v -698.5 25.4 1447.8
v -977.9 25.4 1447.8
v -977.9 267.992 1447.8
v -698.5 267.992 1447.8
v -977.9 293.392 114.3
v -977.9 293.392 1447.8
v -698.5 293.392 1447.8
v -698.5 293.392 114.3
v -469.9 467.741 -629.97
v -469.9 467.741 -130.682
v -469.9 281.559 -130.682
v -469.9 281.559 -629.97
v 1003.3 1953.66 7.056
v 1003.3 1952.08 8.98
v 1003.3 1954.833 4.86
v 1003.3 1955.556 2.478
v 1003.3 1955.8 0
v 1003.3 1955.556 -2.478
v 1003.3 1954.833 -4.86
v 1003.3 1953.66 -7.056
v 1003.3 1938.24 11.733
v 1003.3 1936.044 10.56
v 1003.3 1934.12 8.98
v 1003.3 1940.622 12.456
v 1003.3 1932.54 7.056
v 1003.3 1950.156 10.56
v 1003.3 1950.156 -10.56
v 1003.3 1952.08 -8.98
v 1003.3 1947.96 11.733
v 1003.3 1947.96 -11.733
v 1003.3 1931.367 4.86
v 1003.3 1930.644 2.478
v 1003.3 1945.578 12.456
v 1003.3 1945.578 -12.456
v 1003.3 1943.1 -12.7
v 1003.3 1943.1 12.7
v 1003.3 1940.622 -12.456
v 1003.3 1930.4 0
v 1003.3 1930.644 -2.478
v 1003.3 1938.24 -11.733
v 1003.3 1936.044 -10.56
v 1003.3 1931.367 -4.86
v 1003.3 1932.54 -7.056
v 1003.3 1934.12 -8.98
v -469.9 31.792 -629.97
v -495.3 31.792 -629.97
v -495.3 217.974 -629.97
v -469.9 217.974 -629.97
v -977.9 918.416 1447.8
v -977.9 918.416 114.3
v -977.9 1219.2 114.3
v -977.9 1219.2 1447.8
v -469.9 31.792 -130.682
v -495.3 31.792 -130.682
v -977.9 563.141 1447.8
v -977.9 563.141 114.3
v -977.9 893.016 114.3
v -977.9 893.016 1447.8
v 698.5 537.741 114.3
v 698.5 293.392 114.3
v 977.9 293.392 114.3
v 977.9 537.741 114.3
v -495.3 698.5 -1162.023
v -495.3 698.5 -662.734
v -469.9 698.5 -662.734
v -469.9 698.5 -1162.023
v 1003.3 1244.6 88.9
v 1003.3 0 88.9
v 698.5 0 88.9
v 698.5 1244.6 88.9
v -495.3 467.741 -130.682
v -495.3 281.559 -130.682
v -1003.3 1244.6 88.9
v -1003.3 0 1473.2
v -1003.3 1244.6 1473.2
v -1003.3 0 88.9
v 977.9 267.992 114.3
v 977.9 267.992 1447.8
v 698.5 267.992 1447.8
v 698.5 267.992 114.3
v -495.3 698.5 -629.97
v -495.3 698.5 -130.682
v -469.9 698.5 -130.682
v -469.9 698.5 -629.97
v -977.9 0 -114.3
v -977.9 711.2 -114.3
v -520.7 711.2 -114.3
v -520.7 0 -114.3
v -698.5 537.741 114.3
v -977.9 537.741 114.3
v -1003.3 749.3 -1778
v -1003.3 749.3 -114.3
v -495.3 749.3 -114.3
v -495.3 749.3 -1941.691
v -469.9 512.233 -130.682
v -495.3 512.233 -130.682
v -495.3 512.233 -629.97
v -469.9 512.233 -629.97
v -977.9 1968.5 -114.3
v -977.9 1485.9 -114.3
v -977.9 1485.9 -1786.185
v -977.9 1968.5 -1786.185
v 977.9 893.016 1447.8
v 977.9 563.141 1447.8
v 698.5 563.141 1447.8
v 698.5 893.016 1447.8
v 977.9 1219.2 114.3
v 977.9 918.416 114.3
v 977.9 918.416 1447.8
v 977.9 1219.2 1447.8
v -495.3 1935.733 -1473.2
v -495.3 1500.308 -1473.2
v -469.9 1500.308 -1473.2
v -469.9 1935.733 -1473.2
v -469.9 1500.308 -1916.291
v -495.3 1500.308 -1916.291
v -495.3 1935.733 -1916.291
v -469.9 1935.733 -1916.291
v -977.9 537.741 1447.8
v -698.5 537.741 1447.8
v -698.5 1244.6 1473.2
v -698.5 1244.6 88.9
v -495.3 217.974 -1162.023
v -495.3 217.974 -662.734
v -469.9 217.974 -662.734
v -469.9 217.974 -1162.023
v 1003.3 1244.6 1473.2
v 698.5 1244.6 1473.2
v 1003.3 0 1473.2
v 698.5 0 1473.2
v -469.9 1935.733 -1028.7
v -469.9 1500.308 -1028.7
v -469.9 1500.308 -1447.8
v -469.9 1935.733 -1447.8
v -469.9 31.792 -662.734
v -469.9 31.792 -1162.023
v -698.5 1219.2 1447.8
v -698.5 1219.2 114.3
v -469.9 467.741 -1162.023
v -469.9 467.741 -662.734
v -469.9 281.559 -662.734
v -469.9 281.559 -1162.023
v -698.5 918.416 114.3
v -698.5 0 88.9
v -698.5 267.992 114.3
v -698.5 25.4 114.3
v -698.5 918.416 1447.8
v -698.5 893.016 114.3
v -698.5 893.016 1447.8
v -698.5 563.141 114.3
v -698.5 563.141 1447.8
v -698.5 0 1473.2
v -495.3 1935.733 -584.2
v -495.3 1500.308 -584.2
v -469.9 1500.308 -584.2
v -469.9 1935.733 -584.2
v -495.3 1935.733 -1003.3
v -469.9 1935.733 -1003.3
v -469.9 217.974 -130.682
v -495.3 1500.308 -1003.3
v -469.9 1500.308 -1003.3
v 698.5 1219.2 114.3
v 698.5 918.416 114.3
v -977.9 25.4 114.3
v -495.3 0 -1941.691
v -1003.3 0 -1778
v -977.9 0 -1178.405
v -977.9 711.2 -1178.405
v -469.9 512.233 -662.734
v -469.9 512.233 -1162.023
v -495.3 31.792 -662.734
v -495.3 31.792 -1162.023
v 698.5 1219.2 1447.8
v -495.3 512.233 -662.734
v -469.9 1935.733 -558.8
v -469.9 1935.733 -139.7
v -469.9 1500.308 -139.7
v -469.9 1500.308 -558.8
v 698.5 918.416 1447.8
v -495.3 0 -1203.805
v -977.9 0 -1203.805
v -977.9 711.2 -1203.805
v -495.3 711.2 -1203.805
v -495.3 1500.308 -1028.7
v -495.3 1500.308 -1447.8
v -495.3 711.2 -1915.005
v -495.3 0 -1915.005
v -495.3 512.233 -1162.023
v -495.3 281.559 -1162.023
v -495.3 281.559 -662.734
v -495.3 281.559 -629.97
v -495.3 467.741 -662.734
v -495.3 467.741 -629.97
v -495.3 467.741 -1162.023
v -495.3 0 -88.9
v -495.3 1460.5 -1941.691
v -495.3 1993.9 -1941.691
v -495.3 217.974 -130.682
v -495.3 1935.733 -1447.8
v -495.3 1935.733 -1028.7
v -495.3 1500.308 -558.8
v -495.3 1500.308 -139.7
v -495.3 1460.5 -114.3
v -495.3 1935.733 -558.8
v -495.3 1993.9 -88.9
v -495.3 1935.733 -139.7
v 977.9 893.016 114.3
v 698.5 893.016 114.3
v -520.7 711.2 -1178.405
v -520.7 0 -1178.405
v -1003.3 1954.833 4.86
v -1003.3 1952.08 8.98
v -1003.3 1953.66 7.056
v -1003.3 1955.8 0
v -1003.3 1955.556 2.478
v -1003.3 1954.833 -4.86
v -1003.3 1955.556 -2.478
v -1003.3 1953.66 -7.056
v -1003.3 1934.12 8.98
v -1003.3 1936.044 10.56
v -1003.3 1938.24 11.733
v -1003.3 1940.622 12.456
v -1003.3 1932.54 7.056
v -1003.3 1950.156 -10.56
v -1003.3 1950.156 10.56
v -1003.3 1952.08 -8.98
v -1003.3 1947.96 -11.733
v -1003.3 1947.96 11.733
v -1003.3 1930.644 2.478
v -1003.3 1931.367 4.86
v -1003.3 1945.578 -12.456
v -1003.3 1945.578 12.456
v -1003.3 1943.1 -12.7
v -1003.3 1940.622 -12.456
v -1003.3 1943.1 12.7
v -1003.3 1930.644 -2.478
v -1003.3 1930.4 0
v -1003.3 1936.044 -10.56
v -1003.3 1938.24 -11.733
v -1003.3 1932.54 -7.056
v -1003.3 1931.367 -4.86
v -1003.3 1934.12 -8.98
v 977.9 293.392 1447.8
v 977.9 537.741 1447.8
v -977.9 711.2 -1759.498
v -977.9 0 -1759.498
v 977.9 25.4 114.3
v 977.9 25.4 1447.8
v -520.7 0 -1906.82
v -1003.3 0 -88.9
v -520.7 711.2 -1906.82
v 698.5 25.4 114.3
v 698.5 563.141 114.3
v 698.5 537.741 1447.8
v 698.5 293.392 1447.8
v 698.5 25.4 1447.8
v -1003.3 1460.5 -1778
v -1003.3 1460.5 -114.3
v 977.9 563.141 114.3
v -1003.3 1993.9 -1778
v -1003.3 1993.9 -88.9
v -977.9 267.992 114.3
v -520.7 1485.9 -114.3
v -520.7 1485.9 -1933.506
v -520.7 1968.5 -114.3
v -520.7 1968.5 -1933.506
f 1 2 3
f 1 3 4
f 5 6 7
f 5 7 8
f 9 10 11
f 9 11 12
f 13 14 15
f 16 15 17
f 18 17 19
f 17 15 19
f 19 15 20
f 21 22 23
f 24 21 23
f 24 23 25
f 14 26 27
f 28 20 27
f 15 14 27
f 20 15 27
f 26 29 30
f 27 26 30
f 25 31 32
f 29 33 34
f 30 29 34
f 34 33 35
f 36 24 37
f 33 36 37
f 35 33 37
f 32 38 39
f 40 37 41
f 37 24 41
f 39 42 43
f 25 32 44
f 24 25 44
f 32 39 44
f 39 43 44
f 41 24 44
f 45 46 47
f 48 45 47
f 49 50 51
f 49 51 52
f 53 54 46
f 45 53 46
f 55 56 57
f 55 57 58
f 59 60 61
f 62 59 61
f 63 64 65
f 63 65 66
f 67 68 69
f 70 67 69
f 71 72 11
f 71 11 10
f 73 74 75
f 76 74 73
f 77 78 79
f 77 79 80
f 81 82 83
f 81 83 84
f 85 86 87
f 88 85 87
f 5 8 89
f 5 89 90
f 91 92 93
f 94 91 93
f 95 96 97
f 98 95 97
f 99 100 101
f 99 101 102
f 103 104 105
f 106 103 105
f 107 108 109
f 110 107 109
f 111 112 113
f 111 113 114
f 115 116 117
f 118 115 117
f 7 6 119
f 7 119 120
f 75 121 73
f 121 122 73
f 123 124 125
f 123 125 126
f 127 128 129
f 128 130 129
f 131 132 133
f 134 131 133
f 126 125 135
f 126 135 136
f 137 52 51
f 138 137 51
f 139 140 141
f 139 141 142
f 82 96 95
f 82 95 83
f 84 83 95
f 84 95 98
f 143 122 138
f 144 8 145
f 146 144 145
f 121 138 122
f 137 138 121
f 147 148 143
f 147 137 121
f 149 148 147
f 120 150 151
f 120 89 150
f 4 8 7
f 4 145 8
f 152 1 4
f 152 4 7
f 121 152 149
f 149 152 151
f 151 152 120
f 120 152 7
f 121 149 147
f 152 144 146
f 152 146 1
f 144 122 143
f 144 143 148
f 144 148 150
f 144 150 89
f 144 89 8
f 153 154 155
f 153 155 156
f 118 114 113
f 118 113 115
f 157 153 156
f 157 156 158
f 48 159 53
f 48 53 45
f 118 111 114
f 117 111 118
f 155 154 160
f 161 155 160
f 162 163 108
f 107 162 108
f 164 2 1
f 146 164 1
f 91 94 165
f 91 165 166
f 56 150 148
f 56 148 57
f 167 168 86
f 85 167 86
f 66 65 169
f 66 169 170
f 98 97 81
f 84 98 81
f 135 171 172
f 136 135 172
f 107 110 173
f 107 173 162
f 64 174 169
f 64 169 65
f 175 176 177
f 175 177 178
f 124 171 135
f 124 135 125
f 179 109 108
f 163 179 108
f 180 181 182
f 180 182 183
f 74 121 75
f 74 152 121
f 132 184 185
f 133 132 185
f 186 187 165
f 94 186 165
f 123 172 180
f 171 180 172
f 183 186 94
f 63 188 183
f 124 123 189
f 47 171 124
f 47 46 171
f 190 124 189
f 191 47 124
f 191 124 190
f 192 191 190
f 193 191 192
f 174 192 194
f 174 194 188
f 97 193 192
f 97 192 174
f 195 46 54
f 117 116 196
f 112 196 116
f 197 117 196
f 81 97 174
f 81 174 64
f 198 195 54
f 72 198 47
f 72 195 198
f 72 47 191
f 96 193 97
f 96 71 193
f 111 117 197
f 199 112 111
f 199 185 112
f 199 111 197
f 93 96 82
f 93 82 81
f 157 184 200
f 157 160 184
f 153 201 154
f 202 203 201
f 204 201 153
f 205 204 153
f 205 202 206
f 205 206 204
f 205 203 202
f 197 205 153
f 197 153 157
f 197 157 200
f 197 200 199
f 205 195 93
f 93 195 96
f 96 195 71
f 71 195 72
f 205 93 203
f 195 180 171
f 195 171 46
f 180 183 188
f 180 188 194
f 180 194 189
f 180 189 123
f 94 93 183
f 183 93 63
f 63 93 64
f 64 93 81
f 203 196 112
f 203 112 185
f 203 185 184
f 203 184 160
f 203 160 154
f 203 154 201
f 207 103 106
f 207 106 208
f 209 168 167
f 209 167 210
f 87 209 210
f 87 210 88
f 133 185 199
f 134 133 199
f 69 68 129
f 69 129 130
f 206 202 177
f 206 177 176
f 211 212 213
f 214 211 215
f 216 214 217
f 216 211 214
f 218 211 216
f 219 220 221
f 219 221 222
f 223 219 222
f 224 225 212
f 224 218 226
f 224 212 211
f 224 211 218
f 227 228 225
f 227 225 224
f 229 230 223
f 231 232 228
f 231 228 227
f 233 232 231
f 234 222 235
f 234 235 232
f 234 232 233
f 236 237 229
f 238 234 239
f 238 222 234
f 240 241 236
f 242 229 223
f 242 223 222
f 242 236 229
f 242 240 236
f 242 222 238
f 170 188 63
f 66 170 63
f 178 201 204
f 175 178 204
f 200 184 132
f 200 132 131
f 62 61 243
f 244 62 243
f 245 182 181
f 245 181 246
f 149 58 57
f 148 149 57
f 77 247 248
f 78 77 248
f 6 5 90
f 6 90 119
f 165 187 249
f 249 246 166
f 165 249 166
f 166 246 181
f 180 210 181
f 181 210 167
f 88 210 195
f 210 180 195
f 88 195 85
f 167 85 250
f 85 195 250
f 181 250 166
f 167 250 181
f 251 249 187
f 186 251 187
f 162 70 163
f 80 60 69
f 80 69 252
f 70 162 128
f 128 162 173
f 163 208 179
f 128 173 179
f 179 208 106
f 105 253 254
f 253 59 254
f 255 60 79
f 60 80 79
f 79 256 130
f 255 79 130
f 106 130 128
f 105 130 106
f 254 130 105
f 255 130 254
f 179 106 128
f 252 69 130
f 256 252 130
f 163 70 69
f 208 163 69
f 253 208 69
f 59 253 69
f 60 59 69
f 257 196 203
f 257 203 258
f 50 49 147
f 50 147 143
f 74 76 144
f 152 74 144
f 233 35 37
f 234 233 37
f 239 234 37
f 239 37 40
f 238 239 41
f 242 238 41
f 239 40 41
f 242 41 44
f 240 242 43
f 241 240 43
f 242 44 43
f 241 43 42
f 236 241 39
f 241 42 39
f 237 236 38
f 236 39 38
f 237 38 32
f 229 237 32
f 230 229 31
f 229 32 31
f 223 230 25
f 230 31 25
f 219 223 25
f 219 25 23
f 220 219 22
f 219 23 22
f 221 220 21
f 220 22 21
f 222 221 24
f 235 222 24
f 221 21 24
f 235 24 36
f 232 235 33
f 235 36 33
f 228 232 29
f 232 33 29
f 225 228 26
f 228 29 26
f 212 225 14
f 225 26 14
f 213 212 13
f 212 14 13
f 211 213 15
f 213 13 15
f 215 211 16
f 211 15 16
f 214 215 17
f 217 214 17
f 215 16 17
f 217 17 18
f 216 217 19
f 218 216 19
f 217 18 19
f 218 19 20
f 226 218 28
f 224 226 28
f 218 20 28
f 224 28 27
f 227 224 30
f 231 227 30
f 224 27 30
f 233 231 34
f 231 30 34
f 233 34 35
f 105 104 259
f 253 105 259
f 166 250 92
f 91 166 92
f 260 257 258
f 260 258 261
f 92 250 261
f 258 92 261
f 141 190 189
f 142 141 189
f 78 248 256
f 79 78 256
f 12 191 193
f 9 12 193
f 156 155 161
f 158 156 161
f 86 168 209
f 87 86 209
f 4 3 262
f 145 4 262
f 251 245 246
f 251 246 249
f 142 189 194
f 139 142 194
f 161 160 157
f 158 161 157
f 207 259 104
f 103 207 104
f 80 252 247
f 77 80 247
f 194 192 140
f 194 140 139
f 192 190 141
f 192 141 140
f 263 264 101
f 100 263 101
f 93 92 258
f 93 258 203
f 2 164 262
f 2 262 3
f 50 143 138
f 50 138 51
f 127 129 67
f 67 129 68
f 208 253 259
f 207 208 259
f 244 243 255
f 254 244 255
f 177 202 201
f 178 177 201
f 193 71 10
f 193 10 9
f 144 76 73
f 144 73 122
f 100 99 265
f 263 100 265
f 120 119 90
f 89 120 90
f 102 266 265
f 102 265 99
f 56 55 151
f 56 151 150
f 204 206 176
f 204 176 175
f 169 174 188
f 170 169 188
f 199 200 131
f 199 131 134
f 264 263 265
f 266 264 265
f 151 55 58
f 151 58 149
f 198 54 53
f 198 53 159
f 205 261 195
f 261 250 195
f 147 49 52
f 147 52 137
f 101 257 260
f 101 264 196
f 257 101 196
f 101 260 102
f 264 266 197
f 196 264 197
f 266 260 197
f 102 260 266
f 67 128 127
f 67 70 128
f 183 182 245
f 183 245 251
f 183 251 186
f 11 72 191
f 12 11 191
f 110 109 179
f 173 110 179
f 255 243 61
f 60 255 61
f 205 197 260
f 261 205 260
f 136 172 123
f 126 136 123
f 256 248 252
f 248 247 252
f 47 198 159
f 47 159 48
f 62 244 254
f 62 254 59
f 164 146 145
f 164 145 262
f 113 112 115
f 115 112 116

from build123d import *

# Parameters (mm, degrees)
SKETCH1_R            = 12.7
BOSS_EXTRUDE1_DEPTH  = 2006.6
BOSS_EXTRUDE2_DEPTH  = 38.1
SKETCH4_W            = 457.2
SKETCH4_H            = 1064.104668536
BOSS_EXTRUDE3_DEPTH  = 711.2
SKETCH5_W            = 499.288531824
SKETCH5_H            = 186.266666667
SKETCH5_H_2          = 186.182
BOSS_EXTRUDE4_DEPTH  = 25.4
SKETCH6_W            = 508
SKETCH6_H            = 25.4
BOSS_EXTRUDE5_DEPTH  = 1244.6
BOSS_EXTRUDE6_REACH  = 2886.719
SKETCH7_W            = 508
SKETCH7_H            = 533.4
SKETCH7_W_2          = 457.2
SKETCH7_H_2          = 482.6
SKETCH8_W            = 419.1
SKETCH8_H            = 435.424853887
SKETCH8_W_2          = 443.090744485
BOSS_EXTRUDE7_DEPTH  = 25.4
SKETCH9_W            = 304.8
SKETCH9_H            = 1384.3
BOSS_EXTRUDE8_DEPTH  = 25.4
BOSS_EXTRUDE9_DEPTH  = 1219.2
SKETCH11_W           = 1384.3
SKETCH11_H           = 25.4
BOSS_EXTRUDE10_DEPTH = 279.4


with BuildPart() as part:
    # Sketch1 → Boss-Extrude1 (new body)
    with BuildSketch(Plane.ZY.offset(-1003.3)):
        with Locations(Location((0, 1943.1, 0), (0, 0, 180))):
            Circle(SKETCH1_R)
    extrude(amount=BOSS_EXTRUDE1_DEPTH)


with BuildPart() as body_2:
    # Sketch3 → Boss-Extrude2 (new body)
    with BuildSketch(Plane(origin=(0, 711.2, 0), x_dir=(1, 0, 0), z_dir=(0, 1, 0))):
        Polygon((-495.3, 1941.690744485), (-1003.3, 1778), (-1003.3, 88.9), (-495.3, 88.9), align=None)
    extrude(amount=BOSS_EXTRUDE2_DEPTH)

    # Sketch4 → Boss-Extrude3 (add)
    with BuildSketch(Plane.XZ.offset(-711.2)):
        Polygon((-977.9, -1759.498461275), (-520.7, -1906.820131312), (-495.3, -1915.004668536), (-495.3, -1941.690744485), (-1003.3, -1778), (-1003.3, -88.9), (-495.3, -88.9), (-495.3, -1203.804668536), (-520.7, -1203.804668536), (-977.9, -1203.804668536), align=None)
        with Locations((-749.3, -646.352334268)):
            Rectangle(SKETCH4_W, SKETCH4_H, mode=Mode.SUBTRACT)
    extrude(amount=BOSS_EXTRUDE3_DEPTH)

    # Sketch5 → Boss-Extrude4 (add)
    with BuildSketch(Plane(origin=(-495.3, 0, 0), x_dir=(0, 0, -1), z_dir=(1, 0, 0))):
        with Locations((912.378501402, 605.366666667)):
            Rectangle(SKETCH5_W, SKETCH5_H)
        with Locations((380.326167134, 605.366666667)):
            Rectangle(SKETCH5_W, SKETCH5_H)
        with Locations((912.378501402, 124.883333333)):
            Rectangle(SKETCH5_W, SKETCH5_H_2)
        with Locations((380.326167134, 374.65)):
            Rectangle(SKETCH5_W, SKETCH5_H_2)
        with Locations((380.326167134, 124.883333333)):
            Rectangle(SKETCH5_W, SKETCH5_H_2)
        with Locations((912.378501402, 374.65)):
            Rectangle(SKETCH5_W, SKETCH5_H_2)
    extrude(amount=BOSS_EXTRUDE4_DEPTH)

    # Sketch6 → Boss-Extrude5 (add)
    with BuildSketch(Plane(origin=(0, 749.3, 0), x_dir=(1, 0, 0), z_dir=(0, 1, 0))):
        with Locations((-749.3, 101.6)):
            Rectangle(SKETCH6_W, SKETCH6_H)
    extrude(amount=BOSS_EXTRUDE5_DEPTH)

    # Boss-Extrude6: up to this plane
    boss_extrude6_end = Plane(origin=(-1003.3, 2019.3, -1778), z_dir=(0.306696917141153, 0, 0.9518072289156627))
    # Sketch7 → Boss-Extrude6 (add, up to the surface)
    with BuildSketch(Plane(origin=(0, 0, -114.3), x_dir=(-1, 0, 0), z_dir=(0, 0, -1)), mode=Mode.PRIVATE) as boss_extrude6_sk1:
        with Locations((749.3, 1727.2)):
            Rectangle(SKETCH7_W, SKETCH7_H)
        with Locations((749.3, 1727.2)):
            Rectangle(SKETCH7_W_2, SKETCH7_H_2, mode=Mode.SUBTRACT)
    boss_extrude6_tool1 = split(extrude(boss_extrude6_sk1.sketch, amount=BOSS_EXTRUDE6_REACH, mode=Mode.PRIVATE), bisect_by=boss_extrude6_end, keep=Keep.BOTH, mode=Mode.PRIVATE)
    add(boss_extrude6_tool1.solids().sort_by_distance((-749.3, 1986.534, -114.3))[0])

    # Sketch8 → Boss-Extrude7 (add)
    with BuildSketch(Plane(origin=(-495.3, 0, 0), x_dir=(0, 0, -1), z_dir=(1, 0, 0))):
        with Locations((349.25, 1718.020290396)):
            Rectangle(SKETCH8_W, SKETCH8_H)
        with Locations((793.75, 1718.020290396)):
            Rectangle(SKETCH8_W, SKETCH8_H)
        with Locations((1238.25, 1718.020290396)):
            Rectangle(SKETCH8_W, SKETCH8_H)
        with Locations((1694.745372243, 1718.020290396)):
            Rectangle(SKETCH8_W_2, SKETCH8_H)
    extrude(amount=BOSS_EXTRUDE7_DEPTH)


with BuildPart() as body_3:
    # Sketch9 → Boss-Extrude8 (new body)
    with BuildSketch(Plane(origin=(0, 0, 0), x_dir=(1, 0, 0), z_dir=(0, 1, 0))):
        with Locations((-850.9, -781.05)):
            Rectangle(SKETCH9_W, SKETCH9_H)
    extrude(amount=BOSS_EXTRUDE8_DEPTH)

    # Sketch10 → Boss-Extrude9 (add)
    with BuildSketch(Plane(origin=(0, 25.4, 0), x_dir=(1, 0, 0), z_dir=(0, 1, 0))):
        Polygon((-698.5, -114.3), (-977.9, -114.3), (-977.9, -1447.8), (-698.5, -1447.8), (-698.5, -1473.2), (-1003.3, -1473.2), (-1003.3, -88.9), (-698.5, -88.9), align=None)
    extrude(amount=BOSS_EXTRUDE9_DEPTH)

    # Sketch11 → Boss-Extrude10 (add)
    with BuildSketch(Plane(origin=(-977.9, 0, 0), x_dir=(0, 0, -1), z_dir=(1, 0, 0))):
        with Locations((-781.05, 1231.9)):
            Rectangle(SKETCH11_W, SKETCH11_H)
        with Locations((-781.05, 905.716093533)):
            Rectangle(SKETCH11_W, SKETCH11_H)
        with Locations((-781.05, 550.440690937)):
            Rectangle(SKETCH11_W, SKETCH11_H)
        with Locations((-781.05, 280.691778002)):
            Rectangle(SKETCH11_W, SKETCH11_H)
    extrude(amount=BOSS_EXTRUDE10_DEPTH)


with BuildPart() as body_4:
    # Mirror1: mirrored copy
    add(body_3.part.mirror(Plane(origin=(0, 0, 0), x_dir=(0, 0, 1), z_dir=(1, 0, 0))))


solid = Compound([part.part, body_2.part, body_3.part, body_4.part])
